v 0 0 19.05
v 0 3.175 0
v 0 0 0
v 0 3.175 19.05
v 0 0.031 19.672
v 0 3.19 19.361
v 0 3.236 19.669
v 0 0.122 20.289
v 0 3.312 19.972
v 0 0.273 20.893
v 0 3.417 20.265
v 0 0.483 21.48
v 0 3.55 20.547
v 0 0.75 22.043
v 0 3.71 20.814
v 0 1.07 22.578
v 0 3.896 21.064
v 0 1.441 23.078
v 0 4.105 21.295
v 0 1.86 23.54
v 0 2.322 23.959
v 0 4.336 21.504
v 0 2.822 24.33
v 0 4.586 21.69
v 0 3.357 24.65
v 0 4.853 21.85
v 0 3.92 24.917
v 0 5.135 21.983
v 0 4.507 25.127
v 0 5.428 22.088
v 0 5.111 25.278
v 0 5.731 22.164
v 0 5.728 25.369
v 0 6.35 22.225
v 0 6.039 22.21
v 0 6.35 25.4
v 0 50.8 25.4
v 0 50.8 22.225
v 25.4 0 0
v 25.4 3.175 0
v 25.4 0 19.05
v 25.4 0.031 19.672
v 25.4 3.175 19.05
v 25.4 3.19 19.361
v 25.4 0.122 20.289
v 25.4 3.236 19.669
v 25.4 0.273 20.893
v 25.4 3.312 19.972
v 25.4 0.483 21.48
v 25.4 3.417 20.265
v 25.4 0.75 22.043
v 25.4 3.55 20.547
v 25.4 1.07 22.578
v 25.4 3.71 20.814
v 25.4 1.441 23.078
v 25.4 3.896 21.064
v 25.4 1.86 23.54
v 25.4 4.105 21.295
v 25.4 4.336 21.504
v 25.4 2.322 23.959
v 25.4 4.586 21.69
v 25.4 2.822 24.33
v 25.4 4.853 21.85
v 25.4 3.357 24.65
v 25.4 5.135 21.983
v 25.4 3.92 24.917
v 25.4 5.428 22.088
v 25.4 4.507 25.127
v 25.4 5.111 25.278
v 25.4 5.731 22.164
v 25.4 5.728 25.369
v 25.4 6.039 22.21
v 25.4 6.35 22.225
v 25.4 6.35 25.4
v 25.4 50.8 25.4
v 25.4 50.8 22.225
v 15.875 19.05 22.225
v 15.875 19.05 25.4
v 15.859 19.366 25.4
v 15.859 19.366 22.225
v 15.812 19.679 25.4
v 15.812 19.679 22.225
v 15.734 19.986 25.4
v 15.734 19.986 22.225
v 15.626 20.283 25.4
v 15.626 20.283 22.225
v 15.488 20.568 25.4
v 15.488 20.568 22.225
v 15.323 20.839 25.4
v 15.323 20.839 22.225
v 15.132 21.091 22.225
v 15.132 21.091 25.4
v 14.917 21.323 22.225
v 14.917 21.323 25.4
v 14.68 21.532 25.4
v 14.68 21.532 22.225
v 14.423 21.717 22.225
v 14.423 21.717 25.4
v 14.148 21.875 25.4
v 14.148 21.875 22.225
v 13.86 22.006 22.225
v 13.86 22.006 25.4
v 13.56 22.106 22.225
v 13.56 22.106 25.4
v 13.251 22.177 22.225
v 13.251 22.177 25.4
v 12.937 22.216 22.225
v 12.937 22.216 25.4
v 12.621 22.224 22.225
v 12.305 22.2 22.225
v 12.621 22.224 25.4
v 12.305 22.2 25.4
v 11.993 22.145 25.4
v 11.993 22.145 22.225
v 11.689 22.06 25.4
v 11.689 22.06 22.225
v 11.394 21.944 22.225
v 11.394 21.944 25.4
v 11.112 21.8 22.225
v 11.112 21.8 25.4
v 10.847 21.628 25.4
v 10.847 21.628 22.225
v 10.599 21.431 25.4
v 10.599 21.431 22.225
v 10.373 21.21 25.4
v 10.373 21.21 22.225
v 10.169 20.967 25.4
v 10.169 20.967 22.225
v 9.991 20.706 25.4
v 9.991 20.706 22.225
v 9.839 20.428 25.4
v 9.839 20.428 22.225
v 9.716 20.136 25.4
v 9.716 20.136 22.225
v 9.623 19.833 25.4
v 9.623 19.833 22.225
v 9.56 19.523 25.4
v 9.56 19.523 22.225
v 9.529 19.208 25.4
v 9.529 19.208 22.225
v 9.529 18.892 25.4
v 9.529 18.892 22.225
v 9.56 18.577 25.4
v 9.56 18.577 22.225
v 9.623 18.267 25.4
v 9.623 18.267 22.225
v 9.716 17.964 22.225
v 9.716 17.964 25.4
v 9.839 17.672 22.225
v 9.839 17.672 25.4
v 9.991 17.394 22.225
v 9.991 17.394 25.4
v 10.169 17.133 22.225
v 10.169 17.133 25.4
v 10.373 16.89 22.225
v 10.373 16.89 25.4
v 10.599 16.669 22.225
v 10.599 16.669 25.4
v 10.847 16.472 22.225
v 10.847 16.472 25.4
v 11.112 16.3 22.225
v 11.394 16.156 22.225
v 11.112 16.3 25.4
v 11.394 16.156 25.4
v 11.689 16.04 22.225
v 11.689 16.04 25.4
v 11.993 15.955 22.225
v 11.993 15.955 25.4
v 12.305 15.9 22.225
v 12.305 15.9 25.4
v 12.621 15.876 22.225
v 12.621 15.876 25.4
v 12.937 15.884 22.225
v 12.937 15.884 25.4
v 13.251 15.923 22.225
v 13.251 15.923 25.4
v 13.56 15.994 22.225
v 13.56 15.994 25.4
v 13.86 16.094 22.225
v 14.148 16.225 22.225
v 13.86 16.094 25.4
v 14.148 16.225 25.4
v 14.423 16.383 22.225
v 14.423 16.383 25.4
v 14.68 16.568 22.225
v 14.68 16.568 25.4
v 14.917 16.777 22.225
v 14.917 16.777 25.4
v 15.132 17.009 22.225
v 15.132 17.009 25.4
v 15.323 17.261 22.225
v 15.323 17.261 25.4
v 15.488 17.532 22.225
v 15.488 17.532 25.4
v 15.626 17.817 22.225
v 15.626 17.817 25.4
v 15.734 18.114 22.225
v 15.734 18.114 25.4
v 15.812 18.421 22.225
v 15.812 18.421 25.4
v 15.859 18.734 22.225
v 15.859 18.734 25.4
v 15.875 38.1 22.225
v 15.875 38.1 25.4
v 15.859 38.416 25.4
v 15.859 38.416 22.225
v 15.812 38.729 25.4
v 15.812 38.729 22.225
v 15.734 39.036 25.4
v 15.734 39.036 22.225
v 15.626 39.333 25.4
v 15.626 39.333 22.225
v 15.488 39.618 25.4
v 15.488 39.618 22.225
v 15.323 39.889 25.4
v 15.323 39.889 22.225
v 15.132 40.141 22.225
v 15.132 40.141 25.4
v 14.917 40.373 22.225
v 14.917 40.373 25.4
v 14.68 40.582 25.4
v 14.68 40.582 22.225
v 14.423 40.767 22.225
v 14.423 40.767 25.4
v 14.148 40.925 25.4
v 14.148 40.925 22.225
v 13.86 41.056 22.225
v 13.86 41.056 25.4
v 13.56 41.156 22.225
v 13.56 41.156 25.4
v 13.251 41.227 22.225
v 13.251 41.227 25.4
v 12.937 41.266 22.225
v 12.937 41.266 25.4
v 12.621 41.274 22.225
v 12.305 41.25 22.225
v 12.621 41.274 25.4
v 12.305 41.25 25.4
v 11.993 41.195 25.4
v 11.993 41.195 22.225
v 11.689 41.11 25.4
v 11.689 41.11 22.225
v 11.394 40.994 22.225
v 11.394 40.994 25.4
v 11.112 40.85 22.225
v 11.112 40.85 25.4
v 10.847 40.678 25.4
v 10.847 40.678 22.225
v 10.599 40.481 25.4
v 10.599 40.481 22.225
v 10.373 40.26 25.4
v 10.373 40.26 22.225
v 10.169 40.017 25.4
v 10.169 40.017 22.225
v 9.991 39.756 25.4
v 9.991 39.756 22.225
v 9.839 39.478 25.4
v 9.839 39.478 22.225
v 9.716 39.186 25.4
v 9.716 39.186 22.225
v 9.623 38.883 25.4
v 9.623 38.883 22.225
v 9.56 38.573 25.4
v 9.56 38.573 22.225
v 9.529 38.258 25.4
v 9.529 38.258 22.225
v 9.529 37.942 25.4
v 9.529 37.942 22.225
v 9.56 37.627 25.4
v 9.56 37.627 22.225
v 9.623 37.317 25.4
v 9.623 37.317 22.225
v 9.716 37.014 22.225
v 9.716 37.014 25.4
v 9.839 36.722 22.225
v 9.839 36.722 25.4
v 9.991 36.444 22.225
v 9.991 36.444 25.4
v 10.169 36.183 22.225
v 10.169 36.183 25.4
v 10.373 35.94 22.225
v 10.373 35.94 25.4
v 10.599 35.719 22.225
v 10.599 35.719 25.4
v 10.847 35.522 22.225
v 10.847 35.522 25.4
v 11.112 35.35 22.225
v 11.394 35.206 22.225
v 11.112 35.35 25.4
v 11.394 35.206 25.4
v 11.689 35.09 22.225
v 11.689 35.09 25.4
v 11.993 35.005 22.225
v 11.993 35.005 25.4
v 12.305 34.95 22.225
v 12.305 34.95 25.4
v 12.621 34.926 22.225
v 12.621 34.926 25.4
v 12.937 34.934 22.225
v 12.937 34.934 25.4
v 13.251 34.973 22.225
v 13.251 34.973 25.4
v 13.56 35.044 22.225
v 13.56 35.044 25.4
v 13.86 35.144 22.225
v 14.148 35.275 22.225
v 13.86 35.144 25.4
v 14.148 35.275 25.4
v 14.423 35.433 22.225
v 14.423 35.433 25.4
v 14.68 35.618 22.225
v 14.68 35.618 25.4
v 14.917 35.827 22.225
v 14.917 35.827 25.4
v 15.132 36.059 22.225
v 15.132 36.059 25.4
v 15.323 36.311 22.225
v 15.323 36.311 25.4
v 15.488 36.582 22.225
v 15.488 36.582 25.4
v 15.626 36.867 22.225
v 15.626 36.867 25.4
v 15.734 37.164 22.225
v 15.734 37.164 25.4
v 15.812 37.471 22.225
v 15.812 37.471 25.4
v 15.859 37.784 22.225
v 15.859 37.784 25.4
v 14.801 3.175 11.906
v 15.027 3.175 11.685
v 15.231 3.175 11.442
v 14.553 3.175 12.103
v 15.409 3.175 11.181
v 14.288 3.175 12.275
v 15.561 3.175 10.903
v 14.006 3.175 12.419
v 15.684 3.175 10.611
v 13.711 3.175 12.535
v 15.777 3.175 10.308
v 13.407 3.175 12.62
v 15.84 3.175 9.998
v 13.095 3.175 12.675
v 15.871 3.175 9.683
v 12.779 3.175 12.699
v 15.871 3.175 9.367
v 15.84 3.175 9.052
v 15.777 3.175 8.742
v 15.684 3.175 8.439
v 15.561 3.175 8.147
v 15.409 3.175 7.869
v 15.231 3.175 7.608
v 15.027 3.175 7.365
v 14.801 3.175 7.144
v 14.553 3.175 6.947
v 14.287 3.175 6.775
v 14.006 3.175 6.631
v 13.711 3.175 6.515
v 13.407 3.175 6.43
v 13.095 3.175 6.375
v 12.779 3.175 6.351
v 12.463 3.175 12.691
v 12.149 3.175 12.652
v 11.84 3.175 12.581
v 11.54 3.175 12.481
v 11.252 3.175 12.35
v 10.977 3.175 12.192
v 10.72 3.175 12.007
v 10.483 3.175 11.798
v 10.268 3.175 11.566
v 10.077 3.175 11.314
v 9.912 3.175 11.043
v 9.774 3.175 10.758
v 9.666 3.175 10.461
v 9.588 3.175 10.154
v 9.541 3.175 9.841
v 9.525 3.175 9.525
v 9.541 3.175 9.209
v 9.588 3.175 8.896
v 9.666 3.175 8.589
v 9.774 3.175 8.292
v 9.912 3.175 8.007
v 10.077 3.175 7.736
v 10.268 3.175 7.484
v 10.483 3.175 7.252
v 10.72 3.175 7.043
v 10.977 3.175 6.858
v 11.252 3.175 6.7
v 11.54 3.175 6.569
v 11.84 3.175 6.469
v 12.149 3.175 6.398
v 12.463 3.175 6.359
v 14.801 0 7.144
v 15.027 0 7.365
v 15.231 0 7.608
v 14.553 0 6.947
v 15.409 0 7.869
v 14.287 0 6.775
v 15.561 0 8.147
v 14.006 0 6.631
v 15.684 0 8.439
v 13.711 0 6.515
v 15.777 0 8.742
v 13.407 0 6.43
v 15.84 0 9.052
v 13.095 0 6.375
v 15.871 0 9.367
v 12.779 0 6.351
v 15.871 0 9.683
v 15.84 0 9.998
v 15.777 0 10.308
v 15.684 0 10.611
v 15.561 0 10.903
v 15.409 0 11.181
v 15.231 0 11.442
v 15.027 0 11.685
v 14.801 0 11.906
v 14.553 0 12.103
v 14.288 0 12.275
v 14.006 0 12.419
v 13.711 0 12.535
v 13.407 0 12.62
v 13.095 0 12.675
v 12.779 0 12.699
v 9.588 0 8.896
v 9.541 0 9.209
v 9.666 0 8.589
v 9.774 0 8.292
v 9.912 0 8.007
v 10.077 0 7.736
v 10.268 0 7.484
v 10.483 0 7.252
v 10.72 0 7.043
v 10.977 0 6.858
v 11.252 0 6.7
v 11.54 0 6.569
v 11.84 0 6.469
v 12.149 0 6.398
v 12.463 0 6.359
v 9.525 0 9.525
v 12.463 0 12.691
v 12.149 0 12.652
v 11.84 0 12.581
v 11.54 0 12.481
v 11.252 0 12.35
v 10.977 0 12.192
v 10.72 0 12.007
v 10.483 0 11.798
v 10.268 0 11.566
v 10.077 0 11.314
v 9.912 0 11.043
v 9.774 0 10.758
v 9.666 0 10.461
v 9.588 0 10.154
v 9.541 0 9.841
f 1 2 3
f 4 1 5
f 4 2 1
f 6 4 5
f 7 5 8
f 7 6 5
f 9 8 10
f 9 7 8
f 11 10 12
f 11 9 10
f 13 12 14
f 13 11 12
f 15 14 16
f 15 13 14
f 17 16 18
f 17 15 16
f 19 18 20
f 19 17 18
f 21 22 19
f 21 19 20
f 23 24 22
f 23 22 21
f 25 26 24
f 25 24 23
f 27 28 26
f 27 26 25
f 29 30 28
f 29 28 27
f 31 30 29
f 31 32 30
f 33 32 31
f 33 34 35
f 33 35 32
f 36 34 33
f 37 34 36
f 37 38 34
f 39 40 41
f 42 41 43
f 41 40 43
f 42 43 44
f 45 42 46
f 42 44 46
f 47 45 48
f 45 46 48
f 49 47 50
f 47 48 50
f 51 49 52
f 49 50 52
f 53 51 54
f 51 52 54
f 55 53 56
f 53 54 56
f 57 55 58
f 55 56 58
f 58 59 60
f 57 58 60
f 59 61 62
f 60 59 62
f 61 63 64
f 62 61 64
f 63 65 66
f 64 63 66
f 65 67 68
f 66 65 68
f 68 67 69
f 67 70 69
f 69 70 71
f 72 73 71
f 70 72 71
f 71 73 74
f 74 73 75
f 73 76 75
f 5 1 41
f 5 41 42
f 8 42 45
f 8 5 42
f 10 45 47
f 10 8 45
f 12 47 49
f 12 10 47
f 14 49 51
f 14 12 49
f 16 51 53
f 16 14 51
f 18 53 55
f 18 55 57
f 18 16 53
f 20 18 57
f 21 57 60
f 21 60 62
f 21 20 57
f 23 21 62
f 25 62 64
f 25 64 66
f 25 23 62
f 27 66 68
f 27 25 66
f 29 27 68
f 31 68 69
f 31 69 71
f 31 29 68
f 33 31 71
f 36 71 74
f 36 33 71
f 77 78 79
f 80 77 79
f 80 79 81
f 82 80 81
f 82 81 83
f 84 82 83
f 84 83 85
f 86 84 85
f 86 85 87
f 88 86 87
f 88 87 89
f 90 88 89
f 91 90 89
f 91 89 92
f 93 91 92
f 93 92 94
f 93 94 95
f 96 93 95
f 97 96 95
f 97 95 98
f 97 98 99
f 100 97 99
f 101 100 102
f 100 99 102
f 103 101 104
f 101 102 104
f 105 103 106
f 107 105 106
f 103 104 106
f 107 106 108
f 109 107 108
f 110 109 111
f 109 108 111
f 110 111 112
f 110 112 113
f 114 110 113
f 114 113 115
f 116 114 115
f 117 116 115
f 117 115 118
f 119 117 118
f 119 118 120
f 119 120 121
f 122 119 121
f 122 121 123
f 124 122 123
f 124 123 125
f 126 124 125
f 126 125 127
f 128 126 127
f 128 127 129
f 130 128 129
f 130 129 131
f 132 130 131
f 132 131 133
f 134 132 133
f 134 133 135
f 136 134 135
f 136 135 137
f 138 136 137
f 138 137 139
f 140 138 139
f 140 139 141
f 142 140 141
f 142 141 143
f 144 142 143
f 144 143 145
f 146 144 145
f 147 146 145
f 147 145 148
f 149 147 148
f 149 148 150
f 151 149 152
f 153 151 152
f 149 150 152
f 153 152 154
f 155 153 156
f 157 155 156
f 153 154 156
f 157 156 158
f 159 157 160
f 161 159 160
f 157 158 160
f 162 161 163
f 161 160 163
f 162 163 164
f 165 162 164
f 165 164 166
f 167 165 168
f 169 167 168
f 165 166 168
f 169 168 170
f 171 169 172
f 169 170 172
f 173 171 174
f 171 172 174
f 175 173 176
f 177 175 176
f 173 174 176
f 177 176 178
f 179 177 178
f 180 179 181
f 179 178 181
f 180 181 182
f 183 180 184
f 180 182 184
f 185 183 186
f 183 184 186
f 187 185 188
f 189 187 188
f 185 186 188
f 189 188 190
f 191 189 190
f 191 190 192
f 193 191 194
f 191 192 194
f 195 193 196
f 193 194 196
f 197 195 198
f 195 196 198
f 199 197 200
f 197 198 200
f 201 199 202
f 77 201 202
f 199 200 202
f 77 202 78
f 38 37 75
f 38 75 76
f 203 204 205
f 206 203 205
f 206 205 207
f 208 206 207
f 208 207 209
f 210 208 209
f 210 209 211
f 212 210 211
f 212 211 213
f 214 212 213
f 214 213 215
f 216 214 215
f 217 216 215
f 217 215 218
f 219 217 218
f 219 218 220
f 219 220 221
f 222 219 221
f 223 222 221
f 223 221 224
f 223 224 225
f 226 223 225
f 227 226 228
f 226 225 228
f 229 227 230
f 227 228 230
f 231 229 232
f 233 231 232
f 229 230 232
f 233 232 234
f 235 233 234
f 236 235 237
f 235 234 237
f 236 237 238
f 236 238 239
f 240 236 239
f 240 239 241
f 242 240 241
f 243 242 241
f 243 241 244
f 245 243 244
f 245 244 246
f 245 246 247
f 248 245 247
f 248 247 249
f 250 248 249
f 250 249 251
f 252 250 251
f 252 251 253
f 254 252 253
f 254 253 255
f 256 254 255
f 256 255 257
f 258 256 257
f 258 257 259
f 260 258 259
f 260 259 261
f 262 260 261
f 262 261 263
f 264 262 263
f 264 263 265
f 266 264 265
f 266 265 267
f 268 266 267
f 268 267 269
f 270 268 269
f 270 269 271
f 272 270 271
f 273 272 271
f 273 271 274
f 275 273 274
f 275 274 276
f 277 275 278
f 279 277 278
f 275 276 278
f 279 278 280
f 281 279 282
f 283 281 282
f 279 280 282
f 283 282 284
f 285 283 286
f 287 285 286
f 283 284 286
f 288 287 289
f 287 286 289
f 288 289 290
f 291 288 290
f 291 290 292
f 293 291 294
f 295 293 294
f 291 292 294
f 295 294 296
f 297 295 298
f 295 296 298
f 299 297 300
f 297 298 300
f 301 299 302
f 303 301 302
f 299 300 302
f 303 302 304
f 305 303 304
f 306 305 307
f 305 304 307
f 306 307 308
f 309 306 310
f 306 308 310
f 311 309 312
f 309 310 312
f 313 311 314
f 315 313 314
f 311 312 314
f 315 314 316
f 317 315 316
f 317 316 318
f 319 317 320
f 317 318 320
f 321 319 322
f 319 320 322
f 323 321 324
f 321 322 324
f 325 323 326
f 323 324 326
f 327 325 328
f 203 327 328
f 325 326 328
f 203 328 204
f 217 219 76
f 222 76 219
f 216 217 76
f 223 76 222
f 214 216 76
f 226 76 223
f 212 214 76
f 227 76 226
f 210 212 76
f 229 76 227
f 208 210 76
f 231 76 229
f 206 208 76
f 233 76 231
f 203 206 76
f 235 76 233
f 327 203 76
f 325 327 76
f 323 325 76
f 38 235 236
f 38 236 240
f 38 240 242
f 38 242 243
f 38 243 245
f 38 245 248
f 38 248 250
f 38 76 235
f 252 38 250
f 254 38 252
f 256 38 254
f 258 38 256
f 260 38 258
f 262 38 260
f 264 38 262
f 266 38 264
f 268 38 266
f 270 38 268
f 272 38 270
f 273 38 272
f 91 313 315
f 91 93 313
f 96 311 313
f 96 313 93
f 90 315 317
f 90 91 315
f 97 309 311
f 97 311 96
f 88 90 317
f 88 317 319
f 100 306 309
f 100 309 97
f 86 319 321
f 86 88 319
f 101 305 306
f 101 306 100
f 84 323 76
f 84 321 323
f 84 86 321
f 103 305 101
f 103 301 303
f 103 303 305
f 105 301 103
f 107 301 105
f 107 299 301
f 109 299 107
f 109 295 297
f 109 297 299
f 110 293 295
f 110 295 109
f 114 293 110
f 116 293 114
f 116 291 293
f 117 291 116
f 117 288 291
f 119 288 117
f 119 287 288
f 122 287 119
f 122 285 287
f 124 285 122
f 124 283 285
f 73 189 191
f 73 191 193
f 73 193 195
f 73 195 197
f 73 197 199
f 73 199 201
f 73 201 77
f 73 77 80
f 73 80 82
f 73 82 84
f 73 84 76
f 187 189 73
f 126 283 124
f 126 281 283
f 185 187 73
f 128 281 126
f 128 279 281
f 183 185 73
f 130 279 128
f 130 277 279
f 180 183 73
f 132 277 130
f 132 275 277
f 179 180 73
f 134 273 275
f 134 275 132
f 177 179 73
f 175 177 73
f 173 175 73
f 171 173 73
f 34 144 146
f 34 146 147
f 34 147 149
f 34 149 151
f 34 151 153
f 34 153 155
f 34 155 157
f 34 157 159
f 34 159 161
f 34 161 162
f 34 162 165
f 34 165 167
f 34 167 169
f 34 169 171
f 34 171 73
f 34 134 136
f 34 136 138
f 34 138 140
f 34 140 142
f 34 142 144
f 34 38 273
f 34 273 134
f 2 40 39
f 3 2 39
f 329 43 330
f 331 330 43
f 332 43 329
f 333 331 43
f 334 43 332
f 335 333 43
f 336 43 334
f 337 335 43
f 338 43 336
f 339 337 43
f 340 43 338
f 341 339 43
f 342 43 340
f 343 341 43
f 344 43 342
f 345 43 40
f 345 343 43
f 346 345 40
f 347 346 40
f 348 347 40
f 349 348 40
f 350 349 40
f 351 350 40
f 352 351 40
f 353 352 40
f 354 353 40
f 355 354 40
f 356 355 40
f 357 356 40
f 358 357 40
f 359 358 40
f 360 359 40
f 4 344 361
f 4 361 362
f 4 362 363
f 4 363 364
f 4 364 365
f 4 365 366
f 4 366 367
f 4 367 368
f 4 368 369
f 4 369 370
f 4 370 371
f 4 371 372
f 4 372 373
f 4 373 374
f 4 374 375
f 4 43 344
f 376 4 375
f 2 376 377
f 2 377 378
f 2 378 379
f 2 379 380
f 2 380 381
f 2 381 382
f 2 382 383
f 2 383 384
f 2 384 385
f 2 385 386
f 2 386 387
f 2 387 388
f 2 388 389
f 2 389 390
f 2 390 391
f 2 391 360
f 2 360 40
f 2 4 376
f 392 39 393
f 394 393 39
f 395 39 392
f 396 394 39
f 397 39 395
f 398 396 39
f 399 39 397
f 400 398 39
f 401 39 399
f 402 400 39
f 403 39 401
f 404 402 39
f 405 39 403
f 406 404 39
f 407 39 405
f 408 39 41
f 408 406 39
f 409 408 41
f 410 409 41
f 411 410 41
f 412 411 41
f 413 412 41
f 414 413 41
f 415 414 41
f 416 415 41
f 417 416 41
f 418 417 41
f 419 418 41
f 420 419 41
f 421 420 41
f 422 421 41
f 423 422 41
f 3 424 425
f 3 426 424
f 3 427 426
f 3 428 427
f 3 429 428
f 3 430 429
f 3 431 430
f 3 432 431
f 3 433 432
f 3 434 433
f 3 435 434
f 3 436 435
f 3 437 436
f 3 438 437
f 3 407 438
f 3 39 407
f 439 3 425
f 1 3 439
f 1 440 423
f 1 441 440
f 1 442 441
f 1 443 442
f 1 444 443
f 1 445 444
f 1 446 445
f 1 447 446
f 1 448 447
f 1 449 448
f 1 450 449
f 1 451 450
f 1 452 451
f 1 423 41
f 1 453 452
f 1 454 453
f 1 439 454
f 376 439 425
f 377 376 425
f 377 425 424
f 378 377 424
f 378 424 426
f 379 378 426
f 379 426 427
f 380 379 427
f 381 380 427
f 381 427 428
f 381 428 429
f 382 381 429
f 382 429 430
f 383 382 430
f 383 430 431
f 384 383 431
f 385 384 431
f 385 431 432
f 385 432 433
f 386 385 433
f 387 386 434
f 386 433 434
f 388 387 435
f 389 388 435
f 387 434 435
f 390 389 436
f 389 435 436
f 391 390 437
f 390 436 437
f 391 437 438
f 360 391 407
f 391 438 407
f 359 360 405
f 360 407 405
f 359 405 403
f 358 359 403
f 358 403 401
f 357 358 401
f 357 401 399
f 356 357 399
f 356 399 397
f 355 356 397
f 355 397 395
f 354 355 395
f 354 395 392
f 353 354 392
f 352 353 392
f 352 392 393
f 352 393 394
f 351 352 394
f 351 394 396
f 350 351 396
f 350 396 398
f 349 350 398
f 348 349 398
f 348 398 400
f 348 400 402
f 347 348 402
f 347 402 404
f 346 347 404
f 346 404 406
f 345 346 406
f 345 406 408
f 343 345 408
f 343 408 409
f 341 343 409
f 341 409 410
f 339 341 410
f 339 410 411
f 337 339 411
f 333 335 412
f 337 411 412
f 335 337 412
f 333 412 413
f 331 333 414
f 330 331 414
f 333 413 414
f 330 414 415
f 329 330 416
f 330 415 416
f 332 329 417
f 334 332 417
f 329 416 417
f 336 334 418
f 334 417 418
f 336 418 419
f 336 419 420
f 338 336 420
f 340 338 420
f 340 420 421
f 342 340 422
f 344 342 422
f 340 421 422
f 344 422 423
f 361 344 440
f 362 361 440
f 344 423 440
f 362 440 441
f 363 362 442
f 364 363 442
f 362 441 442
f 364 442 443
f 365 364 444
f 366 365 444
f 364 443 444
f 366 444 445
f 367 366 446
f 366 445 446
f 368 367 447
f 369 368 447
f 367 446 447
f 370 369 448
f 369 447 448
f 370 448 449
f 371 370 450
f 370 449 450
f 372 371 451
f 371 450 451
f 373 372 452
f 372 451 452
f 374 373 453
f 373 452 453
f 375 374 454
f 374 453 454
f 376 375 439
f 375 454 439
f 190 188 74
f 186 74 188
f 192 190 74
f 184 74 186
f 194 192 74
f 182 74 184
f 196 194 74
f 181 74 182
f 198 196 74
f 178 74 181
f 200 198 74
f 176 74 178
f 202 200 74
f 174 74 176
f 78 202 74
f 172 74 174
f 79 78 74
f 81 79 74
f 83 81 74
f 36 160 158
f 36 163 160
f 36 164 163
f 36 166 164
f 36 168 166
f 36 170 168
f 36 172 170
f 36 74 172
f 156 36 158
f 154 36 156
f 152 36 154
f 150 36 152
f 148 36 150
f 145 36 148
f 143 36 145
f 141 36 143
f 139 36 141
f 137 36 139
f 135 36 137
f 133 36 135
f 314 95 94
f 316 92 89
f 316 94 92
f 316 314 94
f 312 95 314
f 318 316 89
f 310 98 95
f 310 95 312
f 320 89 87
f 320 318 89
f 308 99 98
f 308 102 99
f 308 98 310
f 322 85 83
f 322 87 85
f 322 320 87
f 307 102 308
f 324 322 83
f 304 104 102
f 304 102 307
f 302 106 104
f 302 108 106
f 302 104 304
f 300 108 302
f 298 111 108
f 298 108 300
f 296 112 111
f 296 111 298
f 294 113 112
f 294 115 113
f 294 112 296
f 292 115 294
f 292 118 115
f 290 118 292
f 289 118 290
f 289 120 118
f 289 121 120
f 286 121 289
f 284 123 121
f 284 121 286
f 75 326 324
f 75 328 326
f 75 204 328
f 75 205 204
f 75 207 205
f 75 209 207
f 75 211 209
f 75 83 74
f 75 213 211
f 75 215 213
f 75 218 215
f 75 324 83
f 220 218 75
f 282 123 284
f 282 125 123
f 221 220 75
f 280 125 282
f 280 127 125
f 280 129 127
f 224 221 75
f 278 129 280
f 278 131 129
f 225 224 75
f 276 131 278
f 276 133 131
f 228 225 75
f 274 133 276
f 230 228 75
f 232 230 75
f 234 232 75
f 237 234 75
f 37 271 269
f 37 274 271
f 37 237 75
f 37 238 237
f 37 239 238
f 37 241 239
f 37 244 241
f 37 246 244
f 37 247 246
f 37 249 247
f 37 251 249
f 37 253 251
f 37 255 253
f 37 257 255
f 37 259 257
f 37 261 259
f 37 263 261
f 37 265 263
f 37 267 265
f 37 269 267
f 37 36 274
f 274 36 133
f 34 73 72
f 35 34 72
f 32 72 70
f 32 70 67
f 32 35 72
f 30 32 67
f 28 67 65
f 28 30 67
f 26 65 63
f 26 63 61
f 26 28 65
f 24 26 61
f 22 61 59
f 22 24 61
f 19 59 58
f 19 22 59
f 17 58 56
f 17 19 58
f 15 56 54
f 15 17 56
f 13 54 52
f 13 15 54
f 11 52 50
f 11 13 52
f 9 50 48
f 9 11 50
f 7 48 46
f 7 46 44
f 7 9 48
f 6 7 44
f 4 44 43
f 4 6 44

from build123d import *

# Parameters (mm, degrees)
BASE_FLANGE1_DEPTH              = 25.4
F_1_4_0_25_DIAMETER_HOLE1_D     = 6.35
F_1_4_0_25_DIAMETER_HOLE1_DEPTH = 10.7188
F_1_4_0_25_DIAMETER_HOLE1_TIP   = 1.907732465
F_1_4_0_25_DIAMETER_HOLE2_D     = 6.35
F_1_4_0_25_DIAMETER_HOLE2_DEPTH = 10.7188
F_1_4_0_25_DIAMETER_HOLE2_TIP   = 1.907732465


# Sheet-metal steps are written as plain solids
with BuildPart() as part:
    # Sketch1 → Base-Flange1 (new body)
    with BuildSketch(Plane(origin=(0, 0, 0), x_dir=(0, 0, -1), z_dir=(1, 0, 0))):
        with BuildLine():
            Line((0, 0), (-19.05, 0))
            ThreePointArc((-19.05, 0), (-23.540128061, 1.859871939), (-25.4, 6.35))
            Line((-25.4, 6.35), (-25.4, 50.8))
            Line((-25.4, 50.8), (-22.225, 50.8))
            Line((-22.225, 50.8), (-22.225, 6.35))
            ThreePointArc((-22.225, 6.35), (-21.29506403, 4.10493597), (-19.05, 3.175))
            Line((-19.05, 3.175), (0, 3.175))
            Line((0, 3.175), (0, 0))
        make_face()
    extrude(amount=BASE_FLANGE1_DEPTH)

    # 1/4 (0.25) Diameter Hole1
    with Locations(Plane(origin=(0, 0, 22.225), x_dir=(-1, 0, 0), z_dir=(0, 0, -1))):
        with Locations((-12.7, 38.1), (-12.7, 19.05)):
            Hole(F_1_4_0_25_DIAMETER_HOLE1_D / 2, depth=F_1_4_0_25_DIAMETER_HOLE1_DEPTH)
            with Locations((0, 0, -(F_1_4_0_25_DIAMETER_HOLE1_DEPTH + F_1_4_0_25_DIAMETER_HOLE1_TIP / 2))):  # 118° drill point
                Cone(0, F_1_4_0_25_DIAMETER_HOLE1_D / 2, F_1_4_0_25_DIAMETER_HOLE1_TIP, mode=Mode.SUBTRACT)

    # 1/4 (0.25) Diameter Hole2
    with Locations(Plane(origin=(0, 3.175, 0), x_dir=(1, 0, 0), z_dir=(0, 1, 0))):
        with Locations((12.7, -9.525)):
            Hole(F_1_4_0_25_DIAMETER_HOLE2_D / 2, depth=F_1_4_0_25_DIAMETER_HOLE2_DEPTH)
            with Locations((0, 0, -(F_1_4_0_25_DIAMETER_HOLE2_DEPTH + F_1_4_0_25_DIAMETER_HOLE2_TIP / 2))):  # 118° drill point
                Cone(0, F_1_4_0_25_DIAMETER_HOLE2_D / 2, F_1_4_0_25_DIAMETER_HOLE2_TIP, mode=Mode.SUBTRACT)


solid = part.part
